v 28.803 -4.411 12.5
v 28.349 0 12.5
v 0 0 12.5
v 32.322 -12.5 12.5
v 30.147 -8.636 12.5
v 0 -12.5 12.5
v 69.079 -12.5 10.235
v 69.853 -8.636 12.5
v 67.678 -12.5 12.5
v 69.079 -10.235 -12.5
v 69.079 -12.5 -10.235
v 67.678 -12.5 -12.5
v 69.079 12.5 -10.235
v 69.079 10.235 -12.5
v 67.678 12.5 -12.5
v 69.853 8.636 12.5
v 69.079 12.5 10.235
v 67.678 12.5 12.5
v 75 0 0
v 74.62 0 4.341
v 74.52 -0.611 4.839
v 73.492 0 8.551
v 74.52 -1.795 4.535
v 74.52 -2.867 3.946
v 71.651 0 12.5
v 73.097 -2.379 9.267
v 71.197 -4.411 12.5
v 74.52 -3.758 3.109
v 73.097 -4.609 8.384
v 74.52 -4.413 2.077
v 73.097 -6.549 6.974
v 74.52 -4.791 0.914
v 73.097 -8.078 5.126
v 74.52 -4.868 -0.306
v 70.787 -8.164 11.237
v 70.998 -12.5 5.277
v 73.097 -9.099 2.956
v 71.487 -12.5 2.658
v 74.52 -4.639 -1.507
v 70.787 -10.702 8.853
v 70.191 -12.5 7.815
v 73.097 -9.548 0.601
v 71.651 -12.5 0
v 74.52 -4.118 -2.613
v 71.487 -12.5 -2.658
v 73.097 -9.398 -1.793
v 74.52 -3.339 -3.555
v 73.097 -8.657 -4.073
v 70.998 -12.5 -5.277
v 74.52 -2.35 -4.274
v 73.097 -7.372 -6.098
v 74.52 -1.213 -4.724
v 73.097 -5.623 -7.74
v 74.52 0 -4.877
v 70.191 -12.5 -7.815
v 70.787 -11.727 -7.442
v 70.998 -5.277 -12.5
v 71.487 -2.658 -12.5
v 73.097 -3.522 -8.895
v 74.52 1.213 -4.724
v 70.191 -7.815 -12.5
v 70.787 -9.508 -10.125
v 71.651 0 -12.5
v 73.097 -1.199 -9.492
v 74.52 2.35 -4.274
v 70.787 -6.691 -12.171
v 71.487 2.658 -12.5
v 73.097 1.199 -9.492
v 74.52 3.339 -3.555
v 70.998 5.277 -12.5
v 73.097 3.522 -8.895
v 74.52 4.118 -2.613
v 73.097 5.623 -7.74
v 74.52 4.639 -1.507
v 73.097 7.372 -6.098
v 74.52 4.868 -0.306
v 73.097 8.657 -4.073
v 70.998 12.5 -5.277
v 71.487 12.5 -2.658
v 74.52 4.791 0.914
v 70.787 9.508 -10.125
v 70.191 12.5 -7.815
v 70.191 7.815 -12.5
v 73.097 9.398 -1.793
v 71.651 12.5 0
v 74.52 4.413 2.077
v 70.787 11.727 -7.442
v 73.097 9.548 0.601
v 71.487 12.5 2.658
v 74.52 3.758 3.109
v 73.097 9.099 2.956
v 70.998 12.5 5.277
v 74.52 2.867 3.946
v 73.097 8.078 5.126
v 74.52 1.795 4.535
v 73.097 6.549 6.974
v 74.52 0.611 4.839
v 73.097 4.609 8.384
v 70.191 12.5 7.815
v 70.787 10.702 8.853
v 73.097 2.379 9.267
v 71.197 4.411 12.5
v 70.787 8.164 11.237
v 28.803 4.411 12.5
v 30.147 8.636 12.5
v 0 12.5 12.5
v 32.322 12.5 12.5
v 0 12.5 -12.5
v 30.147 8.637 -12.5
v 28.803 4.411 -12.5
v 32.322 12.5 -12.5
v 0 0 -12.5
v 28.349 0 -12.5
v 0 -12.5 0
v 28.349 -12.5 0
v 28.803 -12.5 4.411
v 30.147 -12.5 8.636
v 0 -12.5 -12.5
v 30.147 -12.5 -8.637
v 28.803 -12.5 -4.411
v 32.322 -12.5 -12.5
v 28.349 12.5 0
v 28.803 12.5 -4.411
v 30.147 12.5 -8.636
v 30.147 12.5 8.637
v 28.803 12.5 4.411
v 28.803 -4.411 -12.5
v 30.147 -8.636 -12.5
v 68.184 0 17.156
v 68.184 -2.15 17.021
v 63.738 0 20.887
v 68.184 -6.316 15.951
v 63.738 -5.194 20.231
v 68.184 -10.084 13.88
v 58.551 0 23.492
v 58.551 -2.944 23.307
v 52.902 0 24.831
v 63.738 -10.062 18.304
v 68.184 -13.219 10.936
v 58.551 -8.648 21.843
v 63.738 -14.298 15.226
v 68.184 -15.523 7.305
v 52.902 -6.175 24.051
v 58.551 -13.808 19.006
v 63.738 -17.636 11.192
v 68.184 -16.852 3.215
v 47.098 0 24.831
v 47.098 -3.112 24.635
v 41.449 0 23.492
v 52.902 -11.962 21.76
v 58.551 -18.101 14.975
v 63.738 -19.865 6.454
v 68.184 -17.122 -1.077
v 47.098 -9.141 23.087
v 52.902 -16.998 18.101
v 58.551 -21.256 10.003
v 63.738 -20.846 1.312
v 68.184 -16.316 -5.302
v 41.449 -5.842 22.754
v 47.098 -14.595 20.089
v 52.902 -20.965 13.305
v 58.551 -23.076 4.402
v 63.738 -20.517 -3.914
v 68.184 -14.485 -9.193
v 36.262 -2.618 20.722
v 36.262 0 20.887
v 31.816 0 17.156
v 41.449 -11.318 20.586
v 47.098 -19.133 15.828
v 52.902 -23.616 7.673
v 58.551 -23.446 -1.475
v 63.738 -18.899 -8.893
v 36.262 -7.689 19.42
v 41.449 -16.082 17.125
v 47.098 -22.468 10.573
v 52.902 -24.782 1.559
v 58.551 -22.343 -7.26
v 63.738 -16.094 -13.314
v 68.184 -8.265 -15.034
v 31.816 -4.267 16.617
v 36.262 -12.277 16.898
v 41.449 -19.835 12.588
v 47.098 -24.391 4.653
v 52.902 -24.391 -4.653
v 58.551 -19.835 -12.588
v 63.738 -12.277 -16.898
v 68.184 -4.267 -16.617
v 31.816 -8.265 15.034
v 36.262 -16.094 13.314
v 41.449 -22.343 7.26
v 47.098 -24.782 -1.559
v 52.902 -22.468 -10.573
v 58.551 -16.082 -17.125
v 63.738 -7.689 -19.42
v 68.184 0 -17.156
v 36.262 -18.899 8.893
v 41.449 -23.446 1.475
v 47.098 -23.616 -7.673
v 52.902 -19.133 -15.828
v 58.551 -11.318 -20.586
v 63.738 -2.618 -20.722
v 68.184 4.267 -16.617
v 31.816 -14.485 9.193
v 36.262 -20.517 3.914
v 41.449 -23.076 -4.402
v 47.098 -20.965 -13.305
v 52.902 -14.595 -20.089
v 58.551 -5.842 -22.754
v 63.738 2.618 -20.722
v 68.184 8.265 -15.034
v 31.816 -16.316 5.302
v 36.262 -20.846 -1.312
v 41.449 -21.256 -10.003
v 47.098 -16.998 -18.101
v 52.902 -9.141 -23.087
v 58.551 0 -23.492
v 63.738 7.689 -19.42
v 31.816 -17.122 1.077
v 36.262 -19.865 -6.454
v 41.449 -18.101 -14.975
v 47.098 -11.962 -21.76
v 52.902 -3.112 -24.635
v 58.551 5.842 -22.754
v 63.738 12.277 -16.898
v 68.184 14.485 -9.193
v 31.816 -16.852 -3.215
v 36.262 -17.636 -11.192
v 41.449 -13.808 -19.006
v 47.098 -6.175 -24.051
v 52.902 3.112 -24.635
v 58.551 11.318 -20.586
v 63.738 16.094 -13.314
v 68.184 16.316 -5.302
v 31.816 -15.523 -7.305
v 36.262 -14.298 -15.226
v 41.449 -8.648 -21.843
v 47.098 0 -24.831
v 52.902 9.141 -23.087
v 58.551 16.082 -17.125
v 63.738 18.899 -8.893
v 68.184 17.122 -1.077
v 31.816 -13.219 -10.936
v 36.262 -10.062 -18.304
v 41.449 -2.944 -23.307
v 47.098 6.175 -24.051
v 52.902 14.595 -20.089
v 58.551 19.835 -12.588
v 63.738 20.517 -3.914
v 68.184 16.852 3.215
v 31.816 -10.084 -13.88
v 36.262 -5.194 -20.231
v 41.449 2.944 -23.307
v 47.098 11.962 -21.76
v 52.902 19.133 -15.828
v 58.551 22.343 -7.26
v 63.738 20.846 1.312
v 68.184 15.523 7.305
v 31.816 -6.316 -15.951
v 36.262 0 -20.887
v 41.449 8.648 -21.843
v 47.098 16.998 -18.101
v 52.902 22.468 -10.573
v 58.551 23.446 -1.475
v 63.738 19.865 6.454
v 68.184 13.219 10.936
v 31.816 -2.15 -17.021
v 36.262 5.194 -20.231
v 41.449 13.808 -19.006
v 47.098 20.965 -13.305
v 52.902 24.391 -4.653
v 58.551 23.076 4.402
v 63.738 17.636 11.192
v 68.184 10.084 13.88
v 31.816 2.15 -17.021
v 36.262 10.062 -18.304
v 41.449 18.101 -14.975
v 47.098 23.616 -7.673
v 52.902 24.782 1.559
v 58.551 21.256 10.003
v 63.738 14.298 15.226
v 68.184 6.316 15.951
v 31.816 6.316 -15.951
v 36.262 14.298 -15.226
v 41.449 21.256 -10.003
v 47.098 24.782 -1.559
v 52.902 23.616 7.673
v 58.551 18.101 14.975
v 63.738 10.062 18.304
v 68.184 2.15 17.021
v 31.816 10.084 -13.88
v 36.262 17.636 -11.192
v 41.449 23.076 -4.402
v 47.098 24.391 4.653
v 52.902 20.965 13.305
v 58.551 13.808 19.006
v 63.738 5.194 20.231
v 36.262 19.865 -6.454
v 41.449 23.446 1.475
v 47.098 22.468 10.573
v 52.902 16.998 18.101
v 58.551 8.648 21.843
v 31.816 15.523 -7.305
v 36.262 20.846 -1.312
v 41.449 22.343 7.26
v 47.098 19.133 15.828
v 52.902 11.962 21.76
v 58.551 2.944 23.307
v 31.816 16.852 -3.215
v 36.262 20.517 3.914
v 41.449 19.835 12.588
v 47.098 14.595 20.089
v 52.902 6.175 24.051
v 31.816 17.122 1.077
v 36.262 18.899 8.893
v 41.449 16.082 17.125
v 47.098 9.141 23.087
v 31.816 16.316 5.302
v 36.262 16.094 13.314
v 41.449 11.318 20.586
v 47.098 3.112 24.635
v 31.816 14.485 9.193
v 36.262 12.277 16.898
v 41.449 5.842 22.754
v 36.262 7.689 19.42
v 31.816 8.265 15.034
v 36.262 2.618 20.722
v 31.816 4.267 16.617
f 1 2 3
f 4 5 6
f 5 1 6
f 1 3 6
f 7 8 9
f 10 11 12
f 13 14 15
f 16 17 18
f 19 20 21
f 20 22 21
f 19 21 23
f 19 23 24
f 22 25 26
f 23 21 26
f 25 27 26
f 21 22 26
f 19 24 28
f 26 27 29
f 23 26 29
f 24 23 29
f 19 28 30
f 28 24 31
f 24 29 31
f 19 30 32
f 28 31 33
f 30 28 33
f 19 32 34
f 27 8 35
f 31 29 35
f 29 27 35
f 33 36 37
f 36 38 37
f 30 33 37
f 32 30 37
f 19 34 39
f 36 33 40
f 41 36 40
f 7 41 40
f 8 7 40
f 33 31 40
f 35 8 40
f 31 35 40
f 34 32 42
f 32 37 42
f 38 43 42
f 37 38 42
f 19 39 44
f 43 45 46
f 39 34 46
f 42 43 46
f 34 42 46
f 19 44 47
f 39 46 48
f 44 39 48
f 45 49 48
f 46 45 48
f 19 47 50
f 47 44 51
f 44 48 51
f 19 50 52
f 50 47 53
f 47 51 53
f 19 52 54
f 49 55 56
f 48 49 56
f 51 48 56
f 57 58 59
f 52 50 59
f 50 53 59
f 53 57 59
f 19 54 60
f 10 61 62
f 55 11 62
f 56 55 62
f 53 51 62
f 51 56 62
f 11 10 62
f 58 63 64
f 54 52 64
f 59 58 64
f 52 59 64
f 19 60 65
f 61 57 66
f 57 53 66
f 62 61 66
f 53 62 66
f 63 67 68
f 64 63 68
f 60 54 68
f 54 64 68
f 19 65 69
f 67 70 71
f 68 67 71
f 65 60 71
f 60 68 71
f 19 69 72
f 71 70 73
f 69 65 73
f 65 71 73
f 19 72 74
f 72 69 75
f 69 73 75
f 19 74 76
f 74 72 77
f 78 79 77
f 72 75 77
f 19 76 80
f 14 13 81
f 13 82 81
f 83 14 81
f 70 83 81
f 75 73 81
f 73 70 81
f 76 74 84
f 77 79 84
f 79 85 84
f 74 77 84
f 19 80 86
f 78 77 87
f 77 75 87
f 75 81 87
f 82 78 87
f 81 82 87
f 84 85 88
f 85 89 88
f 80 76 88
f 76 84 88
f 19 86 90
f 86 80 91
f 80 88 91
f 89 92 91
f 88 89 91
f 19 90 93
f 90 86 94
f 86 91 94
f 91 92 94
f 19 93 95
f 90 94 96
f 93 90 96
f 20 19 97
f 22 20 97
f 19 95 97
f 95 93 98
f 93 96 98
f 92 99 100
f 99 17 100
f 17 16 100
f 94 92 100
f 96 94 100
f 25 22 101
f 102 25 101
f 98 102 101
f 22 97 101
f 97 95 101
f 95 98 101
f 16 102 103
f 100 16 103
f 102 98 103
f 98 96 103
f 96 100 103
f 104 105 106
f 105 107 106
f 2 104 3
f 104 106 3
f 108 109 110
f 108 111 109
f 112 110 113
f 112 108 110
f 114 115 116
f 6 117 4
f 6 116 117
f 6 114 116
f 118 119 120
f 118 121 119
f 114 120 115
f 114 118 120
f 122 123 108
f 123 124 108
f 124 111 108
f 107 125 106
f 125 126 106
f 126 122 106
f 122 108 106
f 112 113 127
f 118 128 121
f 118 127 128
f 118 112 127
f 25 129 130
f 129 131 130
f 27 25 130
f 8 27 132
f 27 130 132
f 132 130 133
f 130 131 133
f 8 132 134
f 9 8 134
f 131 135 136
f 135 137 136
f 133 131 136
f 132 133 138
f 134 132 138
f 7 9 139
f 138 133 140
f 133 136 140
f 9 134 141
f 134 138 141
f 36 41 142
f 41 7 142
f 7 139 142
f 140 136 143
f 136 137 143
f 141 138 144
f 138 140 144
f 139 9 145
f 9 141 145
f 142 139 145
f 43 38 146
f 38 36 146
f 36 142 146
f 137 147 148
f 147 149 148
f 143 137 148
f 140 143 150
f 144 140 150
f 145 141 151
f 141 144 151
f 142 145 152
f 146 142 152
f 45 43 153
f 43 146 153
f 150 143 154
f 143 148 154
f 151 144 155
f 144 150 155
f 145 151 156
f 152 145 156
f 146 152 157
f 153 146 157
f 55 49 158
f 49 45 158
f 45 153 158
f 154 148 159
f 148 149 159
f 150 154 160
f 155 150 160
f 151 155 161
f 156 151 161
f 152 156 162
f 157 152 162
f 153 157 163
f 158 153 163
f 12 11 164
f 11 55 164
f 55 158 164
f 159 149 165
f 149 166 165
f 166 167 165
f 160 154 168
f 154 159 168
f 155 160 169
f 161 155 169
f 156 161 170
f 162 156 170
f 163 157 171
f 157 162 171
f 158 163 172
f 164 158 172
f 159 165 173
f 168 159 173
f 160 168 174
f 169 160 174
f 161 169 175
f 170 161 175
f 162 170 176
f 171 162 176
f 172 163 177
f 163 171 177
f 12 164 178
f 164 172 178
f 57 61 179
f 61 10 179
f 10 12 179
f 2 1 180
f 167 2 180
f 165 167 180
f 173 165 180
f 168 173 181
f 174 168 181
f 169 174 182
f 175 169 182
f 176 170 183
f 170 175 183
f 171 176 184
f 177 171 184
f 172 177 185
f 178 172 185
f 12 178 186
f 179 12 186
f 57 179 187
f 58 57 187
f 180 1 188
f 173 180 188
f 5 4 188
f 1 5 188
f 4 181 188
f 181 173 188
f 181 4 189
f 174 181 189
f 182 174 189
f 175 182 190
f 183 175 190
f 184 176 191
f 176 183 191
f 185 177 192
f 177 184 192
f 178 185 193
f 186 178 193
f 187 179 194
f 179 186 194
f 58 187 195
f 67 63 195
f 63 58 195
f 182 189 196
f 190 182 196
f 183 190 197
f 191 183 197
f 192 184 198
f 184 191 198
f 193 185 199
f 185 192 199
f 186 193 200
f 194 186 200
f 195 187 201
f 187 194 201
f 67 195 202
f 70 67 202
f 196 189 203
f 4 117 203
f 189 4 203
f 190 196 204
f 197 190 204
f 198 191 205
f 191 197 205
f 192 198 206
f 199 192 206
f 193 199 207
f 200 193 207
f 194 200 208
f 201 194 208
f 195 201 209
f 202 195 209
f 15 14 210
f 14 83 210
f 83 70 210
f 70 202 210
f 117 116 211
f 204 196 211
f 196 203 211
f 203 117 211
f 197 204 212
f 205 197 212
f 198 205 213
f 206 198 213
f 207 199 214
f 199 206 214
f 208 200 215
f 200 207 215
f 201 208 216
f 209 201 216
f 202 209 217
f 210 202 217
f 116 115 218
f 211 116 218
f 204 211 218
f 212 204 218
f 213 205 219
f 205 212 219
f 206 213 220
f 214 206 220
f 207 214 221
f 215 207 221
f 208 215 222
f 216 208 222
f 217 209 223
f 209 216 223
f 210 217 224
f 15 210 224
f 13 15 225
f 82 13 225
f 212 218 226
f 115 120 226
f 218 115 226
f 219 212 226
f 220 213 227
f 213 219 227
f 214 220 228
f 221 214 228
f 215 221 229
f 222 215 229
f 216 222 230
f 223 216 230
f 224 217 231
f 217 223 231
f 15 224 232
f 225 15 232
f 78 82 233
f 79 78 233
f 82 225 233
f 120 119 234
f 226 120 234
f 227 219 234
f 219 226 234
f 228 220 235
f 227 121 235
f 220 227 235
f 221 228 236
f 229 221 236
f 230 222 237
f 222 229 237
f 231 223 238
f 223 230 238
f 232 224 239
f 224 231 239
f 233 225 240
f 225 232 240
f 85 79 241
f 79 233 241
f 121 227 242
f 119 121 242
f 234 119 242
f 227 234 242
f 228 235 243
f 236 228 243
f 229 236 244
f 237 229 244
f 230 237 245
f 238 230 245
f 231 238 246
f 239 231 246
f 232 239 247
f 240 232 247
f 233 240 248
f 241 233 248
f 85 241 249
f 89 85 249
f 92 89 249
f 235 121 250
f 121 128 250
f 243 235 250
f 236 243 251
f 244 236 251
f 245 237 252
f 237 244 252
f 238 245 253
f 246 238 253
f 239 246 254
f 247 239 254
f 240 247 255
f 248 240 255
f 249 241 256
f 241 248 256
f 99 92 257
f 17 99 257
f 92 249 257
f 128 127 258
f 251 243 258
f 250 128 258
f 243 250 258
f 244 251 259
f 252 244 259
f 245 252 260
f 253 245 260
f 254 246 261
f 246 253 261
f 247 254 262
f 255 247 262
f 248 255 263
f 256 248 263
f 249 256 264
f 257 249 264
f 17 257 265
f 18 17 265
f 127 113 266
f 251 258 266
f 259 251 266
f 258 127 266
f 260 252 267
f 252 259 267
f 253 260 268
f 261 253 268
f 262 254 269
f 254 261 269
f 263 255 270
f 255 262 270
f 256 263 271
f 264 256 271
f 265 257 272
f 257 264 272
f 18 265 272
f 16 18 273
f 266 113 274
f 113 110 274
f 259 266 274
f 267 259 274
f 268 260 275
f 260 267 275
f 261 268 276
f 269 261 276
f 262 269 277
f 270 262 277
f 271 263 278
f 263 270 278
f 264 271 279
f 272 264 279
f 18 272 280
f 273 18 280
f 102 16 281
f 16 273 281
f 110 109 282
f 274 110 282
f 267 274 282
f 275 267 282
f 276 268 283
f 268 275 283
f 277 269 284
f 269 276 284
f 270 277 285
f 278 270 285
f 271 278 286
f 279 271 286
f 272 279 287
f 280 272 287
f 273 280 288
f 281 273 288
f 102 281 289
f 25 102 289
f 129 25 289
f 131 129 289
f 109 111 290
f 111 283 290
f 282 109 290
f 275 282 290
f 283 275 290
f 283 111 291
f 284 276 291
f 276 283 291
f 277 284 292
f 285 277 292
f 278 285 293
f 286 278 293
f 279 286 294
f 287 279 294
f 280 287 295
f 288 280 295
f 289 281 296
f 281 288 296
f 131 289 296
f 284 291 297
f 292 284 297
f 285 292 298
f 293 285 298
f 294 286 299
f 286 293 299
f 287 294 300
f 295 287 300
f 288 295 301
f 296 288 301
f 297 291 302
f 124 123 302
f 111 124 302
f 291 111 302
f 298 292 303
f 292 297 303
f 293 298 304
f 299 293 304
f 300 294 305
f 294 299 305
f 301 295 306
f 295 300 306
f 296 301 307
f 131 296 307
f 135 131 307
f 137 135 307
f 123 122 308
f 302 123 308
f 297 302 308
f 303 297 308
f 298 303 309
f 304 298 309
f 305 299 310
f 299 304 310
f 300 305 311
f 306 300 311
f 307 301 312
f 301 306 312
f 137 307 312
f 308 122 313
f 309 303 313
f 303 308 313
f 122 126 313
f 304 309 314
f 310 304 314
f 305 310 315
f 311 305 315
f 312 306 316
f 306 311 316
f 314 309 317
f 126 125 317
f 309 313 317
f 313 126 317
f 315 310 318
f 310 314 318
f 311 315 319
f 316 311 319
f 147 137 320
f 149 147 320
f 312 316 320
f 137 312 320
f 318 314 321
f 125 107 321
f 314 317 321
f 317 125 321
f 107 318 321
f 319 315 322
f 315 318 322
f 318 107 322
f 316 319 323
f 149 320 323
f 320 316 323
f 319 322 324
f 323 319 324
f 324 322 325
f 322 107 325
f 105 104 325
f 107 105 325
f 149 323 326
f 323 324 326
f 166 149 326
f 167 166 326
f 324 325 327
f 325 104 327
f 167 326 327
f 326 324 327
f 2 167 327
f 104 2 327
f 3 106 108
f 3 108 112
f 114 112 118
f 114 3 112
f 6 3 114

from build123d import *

# Parameters (mm, degrees)
F2_W     = 25
F2_H     = 25
F3_REACH = 110.3563390593


with BuildPart() as f1:
    # F0 (on Front) → F1 (revolve)
    with BuildSketch(Plane.XZ):
        with BuildLine():
            Line((0, 12.5), (0, 0))
            Line((0, 0), (25, 0))
            Line((25, 0), (50, 0))
            Line((50, 0), (75, 0))
            ThreePointArc((75, 0), (56.4704761276, 24.1481456572), (28.3493649054, 12.5))
            Line((28.3493649054, 12.5), (0, 12.5))
        make_face()
    revolve(axis=Axis((12.5, 0, 0), (1, 0, 0)))

    f3_end = f1.faces().sort_by_distance((56.4704761276, 0, -24.1481456572))[0]
    # F2 (on face) → F3 (join, up to a face of the model that its end follows)
    with BuildSketch(Plane(origin=(0, 0, 0), x_dir=(0, -1, 0), z_dir=(-1, 0, 0))):
        Rectangle(F2_W, F2_H)
    f3_long = extrude(amount=-F3_REACH, mode=Mode.PRIVATE)
    add(split(f3_long, bisect_by=f3_end, keep=Keep.ALL, mode=Mode.PRIVATE).solids().sort_by_distance((0, 0, 0))[0])


solid = f1.part
